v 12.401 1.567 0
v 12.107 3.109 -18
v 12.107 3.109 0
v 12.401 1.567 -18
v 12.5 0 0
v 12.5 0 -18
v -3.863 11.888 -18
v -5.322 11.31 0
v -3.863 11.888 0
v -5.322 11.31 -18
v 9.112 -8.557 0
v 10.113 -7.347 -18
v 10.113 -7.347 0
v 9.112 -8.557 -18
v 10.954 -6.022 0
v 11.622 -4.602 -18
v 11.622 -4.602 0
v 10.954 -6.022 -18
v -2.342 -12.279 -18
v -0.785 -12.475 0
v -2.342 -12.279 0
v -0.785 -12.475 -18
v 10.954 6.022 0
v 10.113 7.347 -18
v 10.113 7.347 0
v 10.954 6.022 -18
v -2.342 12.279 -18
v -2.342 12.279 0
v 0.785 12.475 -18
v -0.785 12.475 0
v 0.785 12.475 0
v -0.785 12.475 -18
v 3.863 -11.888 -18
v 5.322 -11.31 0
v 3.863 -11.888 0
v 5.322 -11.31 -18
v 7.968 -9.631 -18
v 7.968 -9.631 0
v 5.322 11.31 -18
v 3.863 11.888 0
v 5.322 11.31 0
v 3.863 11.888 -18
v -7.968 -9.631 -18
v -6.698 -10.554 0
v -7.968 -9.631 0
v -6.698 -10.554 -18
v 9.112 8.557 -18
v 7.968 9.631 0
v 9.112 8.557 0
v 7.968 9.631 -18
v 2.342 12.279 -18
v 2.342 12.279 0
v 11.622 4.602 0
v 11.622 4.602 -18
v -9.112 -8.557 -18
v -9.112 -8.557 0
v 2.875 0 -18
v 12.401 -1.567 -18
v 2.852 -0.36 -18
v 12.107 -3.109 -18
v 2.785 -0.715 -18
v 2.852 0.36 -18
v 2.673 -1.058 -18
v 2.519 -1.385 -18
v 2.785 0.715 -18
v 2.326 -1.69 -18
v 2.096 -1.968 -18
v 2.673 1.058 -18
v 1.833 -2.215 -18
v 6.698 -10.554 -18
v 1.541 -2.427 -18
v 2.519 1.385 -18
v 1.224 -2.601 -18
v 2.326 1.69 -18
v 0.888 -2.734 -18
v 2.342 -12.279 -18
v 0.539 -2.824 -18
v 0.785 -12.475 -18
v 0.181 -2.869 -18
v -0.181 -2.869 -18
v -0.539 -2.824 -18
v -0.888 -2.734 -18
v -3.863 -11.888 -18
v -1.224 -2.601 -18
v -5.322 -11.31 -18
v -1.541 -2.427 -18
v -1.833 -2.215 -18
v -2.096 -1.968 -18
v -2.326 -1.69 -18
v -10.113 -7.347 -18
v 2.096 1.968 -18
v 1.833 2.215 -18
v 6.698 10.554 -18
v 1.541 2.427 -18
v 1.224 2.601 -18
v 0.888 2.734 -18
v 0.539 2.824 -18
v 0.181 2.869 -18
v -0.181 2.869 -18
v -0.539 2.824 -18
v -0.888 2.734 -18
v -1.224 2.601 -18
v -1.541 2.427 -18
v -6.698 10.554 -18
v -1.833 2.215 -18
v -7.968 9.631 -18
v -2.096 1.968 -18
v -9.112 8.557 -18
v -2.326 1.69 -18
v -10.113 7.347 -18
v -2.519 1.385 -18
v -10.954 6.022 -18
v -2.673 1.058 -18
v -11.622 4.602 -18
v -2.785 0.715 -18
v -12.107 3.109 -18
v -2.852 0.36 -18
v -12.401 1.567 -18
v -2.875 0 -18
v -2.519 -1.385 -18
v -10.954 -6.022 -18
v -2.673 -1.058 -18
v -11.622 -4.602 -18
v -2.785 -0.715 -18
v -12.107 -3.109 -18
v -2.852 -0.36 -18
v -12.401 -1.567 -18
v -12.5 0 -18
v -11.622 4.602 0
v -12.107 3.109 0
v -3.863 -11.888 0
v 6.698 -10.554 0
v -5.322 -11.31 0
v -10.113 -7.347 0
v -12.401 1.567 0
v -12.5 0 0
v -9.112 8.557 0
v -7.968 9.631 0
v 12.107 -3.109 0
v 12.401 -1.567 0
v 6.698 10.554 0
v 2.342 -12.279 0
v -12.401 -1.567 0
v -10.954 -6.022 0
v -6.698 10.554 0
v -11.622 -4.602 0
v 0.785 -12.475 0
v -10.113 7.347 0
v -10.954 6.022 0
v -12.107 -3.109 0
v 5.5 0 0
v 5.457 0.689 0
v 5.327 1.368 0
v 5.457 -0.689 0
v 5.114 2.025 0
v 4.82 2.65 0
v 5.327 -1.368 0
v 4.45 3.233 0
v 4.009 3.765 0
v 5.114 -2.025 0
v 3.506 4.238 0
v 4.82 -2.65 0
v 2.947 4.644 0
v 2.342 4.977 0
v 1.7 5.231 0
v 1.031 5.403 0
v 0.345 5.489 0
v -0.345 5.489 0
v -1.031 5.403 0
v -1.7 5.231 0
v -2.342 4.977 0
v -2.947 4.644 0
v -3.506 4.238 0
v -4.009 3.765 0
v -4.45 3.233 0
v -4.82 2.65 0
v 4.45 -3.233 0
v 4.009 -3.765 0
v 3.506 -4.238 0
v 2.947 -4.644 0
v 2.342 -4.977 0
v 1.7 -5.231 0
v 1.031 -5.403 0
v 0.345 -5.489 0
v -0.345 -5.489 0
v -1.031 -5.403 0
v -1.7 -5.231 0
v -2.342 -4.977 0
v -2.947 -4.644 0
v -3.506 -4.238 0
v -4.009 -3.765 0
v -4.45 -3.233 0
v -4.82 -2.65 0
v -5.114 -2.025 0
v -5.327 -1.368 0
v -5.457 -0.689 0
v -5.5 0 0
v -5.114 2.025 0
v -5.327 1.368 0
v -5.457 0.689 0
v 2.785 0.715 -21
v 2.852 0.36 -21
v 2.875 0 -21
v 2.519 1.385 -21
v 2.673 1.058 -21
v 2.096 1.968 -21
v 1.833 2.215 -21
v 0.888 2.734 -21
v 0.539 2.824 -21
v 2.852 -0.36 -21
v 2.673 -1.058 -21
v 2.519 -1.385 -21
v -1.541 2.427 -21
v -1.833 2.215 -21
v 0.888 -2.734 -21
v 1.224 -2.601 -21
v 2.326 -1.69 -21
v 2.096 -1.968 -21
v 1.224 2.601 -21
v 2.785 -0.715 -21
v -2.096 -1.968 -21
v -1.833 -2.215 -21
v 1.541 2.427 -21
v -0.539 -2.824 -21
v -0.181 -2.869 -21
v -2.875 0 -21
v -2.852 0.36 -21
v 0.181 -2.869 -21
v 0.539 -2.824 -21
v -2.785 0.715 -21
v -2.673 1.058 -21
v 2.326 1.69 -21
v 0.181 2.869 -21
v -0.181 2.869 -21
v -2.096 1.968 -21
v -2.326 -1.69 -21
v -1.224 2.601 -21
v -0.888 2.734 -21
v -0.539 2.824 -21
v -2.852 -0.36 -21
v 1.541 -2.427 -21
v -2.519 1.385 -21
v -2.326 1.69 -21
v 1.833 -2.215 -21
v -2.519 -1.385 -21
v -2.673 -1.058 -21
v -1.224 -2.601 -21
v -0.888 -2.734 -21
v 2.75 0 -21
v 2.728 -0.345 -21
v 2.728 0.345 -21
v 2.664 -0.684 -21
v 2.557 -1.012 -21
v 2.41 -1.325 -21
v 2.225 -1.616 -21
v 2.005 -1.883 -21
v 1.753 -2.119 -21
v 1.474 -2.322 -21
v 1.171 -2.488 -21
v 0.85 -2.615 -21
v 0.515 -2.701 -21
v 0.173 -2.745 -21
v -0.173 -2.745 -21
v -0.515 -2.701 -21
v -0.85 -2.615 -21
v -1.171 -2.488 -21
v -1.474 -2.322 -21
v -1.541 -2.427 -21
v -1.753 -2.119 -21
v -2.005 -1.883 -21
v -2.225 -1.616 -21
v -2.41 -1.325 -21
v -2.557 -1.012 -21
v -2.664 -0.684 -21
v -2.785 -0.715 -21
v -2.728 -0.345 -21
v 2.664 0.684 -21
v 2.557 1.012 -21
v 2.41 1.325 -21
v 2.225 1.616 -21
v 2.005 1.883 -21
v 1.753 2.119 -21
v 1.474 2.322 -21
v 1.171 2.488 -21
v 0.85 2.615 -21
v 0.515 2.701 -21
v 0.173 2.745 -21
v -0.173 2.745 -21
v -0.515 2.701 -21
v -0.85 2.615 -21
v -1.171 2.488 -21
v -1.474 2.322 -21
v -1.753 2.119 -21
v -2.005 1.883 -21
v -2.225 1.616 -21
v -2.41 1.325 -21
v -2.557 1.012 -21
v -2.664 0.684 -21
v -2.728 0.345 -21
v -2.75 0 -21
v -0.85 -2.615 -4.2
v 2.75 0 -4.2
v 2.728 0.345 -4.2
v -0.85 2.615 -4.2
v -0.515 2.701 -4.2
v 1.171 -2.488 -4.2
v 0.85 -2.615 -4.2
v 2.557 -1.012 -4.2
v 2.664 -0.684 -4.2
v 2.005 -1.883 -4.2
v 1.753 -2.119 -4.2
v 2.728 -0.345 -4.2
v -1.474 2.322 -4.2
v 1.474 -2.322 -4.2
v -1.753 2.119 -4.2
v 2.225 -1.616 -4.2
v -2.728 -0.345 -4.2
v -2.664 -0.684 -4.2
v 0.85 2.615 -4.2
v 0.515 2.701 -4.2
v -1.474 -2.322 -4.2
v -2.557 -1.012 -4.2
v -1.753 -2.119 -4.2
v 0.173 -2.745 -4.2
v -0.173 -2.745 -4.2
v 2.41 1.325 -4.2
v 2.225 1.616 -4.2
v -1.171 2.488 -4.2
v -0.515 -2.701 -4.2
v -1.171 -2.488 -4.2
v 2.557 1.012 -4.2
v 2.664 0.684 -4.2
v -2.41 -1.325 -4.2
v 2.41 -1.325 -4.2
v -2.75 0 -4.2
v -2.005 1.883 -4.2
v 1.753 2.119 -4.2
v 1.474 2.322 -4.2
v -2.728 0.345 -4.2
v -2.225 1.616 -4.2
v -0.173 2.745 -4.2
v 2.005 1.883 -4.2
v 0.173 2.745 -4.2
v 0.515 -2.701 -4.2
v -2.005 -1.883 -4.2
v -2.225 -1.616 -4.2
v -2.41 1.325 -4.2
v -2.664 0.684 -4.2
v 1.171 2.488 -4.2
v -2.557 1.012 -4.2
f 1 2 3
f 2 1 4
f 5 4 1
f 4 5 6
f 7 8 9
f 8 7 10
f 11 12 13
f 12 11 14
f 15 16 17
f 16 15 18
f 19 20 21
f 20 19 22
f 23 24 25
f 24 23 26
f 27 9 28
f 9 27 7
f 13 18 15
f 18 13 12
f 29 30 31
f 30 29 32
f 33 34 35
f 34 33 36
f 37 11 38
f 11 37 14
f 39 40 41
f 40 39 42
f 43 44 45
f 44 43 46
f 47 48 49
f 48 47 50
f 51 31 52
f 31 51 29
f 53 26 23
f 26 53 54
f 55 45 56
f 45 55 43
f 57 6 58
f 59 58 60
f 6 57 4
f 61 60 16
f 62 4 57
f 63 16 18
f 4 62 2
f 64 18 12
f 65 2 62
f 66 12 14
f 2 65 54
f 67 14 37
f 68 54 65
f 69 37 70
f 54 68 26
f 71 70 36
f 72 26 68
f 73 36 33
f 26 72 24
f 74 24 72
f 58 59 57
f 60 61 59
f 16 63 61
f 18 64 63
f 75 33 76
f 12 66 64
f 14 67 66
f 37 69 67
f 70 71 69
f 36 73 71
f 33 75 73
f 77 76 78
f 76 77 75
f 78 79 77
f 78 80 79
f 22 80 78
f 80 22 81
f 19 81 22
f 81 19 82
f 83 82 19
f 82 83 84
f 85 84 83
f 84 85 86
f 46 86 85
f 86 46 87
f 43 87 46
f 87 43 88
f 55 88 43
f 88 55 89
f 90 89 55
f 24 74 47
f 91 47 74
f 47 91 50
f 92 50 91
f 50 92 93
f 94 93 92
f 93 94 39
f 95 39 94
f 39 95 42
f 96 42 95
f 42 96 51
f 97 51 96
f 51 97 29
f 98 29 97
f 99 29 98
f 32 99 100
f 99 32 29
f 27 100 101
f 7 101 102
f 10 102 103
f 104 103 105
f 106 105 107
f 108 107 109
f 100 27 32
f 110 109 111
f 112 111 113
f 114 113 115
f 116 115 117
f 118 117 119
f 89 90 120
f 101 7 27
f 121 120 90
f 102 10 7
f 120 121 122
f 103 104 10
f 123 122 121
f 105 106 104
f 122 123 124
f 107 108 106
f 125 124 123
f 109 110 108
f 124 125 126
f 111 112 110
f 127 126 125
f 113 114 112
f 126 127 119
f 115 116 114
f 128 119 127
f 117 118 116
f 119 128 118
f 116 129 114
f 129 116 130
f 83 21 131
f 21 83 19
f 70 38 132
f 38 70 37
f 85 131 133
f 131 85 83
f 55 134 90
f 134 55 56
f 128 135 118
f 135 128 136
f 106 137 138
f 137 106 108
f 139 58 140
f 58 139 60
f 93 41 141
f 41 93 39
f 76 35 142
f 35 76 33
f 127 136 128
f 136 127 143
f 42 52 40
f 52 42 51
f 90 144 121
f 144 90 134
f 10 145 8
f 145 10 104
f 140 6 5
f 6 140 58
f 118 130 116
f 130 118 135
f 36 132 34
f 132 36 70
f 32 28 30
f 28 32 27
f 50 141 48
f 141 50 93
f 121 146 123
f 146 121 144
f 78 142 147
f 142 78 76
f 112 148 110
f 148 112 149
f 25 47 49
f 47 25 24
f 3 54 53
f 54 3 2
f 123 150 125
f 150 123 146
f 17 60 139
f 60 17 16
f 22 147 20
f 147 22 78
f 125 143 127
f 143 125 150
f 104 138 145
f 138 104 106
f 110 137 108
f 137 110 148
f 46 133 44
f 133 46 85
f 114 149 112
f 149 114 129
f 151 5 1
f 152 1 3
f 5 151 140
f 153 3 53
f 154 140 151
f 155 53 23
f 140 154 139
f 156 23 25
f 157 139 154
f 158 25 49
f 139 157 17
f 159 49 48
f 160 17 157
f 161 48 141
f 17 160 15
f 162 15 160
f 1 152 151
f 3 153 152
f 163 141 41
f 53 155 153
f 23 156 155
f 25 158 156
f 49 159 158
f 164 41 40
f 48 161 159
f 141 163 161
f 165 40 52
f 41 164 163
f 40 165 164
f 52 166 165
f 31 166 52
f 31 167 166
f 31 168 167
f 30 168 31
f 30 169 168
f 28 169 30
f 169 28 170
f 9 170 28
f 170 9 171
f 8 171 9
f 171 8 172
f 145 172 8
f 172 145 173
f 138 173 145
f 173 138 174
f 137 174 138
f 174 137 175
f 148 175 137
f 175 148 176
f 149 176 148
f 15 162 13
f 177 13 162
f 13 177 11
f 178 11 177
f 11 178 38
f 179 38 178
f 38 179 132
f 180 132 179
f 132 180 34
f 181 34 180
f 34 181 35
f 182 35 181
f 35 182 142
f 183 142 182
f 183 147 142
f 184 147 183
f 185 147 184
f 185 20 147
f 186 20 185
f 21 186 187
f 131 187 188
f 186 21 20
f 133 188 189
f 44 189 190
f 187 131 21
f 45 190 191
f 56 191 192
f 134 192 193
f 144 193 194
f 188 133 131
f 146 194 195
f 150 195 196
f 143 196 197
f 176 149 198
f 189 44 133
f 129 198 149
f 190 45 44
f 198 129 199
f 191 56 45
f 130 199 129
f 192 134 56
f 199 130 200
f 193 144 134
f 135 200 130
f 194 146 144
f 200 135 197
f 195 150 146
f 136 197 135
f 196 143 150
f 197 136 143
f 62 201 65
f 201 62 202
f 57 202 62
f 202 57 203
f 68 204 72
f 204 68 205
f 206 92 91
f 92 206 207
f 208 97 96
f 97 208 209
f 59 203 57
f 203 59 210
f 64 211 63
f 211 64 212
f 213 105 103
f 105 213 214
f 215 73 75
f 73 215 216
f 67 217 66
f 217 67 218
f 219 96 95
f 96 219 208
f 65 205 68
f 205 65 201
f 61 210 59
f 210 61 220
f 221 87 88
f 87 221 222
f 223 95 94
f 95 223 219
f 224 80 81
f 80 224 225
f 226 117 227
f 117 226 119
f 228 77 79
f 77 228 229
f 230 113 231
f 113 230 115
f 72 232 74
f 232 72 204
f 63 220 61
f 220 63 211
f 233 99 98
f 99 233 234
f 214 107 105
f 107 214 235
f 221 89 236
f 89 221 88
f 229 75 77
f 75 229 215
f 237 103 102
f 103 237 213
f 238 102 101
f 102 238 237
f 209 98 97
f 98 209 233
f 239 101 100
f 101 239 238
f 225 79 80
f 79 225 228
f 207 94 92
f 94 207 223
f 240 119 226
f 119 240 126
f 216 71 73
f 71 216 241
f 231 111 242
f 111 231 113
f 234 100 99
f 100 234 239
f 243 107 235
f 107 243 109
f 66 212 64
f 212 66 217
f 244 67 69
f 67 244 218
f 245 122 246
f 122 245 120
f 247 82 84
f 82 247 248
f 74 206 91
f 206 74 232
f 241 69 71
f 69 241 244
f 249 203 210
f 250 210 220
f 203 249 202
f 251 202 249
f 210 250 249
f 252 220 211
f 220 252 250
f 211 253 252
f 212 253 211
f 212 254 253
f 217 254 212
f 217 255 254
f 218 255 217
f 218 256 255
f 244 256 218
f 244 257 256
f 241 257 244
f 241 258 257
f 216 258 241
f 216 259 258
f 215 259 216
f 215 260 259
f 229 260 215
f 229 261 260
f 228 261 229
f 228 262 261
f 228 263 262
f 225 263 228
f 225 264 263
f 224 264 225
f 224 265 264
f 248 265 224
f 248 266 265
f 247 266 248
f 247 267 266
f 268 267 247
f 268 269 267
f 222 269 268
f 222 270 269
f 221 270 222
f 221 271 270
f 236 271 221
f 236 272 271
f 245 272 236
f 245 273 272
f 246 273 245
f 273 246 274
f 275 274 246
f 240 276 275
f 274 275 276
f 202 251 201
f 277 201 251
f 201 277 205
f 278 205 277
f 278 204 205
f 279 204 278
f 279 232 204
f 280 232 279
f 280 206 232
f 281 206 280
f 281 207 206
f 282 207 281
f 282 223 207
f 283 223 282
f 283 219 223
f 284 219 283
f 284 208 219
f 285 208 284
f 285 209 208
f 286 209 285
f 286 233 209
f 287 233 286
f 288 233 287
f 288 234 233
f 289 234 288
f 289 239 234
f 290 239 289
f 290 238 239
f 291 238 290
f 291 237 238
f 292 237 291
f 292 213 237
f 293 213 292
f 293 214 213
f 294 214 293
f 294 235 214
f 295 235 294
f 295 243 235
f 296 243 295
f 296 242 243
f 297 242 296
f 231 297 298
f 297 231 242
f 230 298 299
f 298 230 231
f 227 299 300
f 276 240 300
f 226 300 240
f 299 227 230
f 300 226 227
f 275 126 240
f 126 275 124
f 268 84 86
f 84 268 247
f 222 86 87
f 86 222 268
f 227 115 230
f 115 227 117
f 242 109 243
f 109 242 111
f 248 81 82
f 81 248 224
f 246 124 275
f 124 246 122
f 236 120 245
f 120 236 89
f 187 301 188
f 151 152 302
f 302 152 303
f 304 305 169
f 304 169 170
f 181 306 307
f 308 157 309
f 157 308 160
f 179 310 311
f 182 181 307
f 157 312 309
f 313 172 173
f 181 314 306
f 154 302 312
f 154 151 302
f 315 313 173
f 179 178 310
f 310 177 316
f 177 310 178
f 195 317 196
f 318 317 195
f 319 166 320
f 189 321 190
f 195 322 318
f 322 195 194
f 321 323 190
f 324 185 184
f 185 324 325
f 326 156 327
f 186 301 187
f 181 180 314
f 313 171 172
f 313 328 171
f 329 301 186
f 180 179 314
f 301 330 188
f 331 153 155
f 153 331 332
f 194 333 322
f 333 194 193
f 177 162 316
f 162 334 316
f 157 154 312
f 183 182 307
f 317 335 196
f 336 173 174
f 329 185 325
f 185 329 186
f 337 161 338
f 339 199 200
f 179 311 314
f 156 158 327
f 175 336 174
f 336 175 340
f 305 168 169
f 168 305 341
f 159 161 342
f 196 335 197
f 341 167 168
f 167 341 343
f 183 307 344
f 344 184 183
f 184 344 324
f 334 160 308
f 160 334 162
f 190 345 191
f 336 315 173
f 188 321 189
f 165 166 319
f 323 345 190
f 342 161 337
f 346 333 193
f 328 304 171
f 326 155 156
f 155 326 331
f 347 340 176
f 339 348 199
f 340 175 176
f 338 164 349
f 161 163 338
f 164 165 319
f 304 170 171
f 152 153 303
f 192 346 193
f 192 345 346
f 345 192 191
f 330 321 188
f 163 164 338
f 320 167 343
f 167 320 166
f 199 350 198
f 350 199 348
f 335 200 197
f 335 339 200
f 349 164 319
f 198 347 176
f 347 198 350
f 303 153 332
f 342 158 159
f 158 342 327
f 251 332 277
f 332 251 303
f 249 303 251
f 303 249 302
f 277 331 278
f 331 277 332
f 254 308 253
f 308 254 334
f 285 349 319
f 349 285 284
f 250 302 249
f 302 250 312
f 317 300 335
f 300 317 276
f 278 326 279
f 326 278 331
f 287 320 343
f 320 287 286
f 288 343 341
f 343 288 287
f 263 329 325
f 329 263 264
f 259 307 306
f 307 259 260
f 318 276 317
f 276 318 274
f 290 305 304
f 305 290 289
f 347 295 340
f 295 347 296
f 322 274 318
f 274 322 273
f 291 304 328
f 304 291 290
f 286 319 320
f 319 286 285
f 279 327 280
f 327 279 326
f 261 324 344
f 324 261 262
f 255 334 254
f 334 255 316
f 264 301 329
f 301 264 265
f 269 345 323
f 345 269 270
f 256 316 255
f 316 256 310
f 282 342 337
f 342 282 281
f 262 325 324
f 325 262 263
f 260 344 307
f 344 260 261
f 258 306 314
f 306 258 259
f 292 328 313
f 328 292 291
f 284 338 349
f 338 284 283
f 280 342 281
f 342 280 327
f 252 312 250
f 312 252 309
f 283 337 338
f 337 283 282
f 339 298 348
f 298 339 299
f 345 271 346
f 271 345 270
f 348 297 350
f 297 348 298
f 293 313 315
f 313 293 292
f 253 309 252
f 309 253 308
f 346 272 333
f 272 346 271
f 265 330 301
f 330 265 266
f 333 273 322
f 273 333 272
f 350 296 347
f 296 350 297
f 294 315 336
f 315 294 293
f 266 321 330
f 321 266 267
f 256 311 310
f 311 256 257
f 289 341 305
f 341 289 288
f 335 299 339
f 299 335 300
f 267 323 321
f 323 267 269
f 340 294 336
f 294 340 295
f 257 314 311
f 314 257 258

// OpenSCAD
$fn = 50;

difference() {
	union() {
		translate(v = [0, 0, -18.0]) {
			cylinder(h = 18, r = 12.5);
		}
		#translate(v = [0, 0, -21.0]) {
			cylinder(h = 21, r = 2.875);
		}
	}
	union() {
		translate(v = [0, 0, 0]) {
			rotate(a = [0, 0, 0]) {
				difference() {
					union() {
						translate(v = [0, 0, -21.0]) {
							cylinder(h = 21, r = 2.25);
						}
						translate(v = [0, 0, -4.2]) {
							cylinder(h = 4.2, r1 = 2.75, r2 = 5.5);
						}
						translate(v = [0, 0, -21.0]) {
							cylinder(h = 21, r = 2.75);
						}
						translate(v = [0, 0, -21.0]) {
							cylinder(h = 21, r = 2.25);
						}
					}
					union();
				}
			}
		}
	}
}
